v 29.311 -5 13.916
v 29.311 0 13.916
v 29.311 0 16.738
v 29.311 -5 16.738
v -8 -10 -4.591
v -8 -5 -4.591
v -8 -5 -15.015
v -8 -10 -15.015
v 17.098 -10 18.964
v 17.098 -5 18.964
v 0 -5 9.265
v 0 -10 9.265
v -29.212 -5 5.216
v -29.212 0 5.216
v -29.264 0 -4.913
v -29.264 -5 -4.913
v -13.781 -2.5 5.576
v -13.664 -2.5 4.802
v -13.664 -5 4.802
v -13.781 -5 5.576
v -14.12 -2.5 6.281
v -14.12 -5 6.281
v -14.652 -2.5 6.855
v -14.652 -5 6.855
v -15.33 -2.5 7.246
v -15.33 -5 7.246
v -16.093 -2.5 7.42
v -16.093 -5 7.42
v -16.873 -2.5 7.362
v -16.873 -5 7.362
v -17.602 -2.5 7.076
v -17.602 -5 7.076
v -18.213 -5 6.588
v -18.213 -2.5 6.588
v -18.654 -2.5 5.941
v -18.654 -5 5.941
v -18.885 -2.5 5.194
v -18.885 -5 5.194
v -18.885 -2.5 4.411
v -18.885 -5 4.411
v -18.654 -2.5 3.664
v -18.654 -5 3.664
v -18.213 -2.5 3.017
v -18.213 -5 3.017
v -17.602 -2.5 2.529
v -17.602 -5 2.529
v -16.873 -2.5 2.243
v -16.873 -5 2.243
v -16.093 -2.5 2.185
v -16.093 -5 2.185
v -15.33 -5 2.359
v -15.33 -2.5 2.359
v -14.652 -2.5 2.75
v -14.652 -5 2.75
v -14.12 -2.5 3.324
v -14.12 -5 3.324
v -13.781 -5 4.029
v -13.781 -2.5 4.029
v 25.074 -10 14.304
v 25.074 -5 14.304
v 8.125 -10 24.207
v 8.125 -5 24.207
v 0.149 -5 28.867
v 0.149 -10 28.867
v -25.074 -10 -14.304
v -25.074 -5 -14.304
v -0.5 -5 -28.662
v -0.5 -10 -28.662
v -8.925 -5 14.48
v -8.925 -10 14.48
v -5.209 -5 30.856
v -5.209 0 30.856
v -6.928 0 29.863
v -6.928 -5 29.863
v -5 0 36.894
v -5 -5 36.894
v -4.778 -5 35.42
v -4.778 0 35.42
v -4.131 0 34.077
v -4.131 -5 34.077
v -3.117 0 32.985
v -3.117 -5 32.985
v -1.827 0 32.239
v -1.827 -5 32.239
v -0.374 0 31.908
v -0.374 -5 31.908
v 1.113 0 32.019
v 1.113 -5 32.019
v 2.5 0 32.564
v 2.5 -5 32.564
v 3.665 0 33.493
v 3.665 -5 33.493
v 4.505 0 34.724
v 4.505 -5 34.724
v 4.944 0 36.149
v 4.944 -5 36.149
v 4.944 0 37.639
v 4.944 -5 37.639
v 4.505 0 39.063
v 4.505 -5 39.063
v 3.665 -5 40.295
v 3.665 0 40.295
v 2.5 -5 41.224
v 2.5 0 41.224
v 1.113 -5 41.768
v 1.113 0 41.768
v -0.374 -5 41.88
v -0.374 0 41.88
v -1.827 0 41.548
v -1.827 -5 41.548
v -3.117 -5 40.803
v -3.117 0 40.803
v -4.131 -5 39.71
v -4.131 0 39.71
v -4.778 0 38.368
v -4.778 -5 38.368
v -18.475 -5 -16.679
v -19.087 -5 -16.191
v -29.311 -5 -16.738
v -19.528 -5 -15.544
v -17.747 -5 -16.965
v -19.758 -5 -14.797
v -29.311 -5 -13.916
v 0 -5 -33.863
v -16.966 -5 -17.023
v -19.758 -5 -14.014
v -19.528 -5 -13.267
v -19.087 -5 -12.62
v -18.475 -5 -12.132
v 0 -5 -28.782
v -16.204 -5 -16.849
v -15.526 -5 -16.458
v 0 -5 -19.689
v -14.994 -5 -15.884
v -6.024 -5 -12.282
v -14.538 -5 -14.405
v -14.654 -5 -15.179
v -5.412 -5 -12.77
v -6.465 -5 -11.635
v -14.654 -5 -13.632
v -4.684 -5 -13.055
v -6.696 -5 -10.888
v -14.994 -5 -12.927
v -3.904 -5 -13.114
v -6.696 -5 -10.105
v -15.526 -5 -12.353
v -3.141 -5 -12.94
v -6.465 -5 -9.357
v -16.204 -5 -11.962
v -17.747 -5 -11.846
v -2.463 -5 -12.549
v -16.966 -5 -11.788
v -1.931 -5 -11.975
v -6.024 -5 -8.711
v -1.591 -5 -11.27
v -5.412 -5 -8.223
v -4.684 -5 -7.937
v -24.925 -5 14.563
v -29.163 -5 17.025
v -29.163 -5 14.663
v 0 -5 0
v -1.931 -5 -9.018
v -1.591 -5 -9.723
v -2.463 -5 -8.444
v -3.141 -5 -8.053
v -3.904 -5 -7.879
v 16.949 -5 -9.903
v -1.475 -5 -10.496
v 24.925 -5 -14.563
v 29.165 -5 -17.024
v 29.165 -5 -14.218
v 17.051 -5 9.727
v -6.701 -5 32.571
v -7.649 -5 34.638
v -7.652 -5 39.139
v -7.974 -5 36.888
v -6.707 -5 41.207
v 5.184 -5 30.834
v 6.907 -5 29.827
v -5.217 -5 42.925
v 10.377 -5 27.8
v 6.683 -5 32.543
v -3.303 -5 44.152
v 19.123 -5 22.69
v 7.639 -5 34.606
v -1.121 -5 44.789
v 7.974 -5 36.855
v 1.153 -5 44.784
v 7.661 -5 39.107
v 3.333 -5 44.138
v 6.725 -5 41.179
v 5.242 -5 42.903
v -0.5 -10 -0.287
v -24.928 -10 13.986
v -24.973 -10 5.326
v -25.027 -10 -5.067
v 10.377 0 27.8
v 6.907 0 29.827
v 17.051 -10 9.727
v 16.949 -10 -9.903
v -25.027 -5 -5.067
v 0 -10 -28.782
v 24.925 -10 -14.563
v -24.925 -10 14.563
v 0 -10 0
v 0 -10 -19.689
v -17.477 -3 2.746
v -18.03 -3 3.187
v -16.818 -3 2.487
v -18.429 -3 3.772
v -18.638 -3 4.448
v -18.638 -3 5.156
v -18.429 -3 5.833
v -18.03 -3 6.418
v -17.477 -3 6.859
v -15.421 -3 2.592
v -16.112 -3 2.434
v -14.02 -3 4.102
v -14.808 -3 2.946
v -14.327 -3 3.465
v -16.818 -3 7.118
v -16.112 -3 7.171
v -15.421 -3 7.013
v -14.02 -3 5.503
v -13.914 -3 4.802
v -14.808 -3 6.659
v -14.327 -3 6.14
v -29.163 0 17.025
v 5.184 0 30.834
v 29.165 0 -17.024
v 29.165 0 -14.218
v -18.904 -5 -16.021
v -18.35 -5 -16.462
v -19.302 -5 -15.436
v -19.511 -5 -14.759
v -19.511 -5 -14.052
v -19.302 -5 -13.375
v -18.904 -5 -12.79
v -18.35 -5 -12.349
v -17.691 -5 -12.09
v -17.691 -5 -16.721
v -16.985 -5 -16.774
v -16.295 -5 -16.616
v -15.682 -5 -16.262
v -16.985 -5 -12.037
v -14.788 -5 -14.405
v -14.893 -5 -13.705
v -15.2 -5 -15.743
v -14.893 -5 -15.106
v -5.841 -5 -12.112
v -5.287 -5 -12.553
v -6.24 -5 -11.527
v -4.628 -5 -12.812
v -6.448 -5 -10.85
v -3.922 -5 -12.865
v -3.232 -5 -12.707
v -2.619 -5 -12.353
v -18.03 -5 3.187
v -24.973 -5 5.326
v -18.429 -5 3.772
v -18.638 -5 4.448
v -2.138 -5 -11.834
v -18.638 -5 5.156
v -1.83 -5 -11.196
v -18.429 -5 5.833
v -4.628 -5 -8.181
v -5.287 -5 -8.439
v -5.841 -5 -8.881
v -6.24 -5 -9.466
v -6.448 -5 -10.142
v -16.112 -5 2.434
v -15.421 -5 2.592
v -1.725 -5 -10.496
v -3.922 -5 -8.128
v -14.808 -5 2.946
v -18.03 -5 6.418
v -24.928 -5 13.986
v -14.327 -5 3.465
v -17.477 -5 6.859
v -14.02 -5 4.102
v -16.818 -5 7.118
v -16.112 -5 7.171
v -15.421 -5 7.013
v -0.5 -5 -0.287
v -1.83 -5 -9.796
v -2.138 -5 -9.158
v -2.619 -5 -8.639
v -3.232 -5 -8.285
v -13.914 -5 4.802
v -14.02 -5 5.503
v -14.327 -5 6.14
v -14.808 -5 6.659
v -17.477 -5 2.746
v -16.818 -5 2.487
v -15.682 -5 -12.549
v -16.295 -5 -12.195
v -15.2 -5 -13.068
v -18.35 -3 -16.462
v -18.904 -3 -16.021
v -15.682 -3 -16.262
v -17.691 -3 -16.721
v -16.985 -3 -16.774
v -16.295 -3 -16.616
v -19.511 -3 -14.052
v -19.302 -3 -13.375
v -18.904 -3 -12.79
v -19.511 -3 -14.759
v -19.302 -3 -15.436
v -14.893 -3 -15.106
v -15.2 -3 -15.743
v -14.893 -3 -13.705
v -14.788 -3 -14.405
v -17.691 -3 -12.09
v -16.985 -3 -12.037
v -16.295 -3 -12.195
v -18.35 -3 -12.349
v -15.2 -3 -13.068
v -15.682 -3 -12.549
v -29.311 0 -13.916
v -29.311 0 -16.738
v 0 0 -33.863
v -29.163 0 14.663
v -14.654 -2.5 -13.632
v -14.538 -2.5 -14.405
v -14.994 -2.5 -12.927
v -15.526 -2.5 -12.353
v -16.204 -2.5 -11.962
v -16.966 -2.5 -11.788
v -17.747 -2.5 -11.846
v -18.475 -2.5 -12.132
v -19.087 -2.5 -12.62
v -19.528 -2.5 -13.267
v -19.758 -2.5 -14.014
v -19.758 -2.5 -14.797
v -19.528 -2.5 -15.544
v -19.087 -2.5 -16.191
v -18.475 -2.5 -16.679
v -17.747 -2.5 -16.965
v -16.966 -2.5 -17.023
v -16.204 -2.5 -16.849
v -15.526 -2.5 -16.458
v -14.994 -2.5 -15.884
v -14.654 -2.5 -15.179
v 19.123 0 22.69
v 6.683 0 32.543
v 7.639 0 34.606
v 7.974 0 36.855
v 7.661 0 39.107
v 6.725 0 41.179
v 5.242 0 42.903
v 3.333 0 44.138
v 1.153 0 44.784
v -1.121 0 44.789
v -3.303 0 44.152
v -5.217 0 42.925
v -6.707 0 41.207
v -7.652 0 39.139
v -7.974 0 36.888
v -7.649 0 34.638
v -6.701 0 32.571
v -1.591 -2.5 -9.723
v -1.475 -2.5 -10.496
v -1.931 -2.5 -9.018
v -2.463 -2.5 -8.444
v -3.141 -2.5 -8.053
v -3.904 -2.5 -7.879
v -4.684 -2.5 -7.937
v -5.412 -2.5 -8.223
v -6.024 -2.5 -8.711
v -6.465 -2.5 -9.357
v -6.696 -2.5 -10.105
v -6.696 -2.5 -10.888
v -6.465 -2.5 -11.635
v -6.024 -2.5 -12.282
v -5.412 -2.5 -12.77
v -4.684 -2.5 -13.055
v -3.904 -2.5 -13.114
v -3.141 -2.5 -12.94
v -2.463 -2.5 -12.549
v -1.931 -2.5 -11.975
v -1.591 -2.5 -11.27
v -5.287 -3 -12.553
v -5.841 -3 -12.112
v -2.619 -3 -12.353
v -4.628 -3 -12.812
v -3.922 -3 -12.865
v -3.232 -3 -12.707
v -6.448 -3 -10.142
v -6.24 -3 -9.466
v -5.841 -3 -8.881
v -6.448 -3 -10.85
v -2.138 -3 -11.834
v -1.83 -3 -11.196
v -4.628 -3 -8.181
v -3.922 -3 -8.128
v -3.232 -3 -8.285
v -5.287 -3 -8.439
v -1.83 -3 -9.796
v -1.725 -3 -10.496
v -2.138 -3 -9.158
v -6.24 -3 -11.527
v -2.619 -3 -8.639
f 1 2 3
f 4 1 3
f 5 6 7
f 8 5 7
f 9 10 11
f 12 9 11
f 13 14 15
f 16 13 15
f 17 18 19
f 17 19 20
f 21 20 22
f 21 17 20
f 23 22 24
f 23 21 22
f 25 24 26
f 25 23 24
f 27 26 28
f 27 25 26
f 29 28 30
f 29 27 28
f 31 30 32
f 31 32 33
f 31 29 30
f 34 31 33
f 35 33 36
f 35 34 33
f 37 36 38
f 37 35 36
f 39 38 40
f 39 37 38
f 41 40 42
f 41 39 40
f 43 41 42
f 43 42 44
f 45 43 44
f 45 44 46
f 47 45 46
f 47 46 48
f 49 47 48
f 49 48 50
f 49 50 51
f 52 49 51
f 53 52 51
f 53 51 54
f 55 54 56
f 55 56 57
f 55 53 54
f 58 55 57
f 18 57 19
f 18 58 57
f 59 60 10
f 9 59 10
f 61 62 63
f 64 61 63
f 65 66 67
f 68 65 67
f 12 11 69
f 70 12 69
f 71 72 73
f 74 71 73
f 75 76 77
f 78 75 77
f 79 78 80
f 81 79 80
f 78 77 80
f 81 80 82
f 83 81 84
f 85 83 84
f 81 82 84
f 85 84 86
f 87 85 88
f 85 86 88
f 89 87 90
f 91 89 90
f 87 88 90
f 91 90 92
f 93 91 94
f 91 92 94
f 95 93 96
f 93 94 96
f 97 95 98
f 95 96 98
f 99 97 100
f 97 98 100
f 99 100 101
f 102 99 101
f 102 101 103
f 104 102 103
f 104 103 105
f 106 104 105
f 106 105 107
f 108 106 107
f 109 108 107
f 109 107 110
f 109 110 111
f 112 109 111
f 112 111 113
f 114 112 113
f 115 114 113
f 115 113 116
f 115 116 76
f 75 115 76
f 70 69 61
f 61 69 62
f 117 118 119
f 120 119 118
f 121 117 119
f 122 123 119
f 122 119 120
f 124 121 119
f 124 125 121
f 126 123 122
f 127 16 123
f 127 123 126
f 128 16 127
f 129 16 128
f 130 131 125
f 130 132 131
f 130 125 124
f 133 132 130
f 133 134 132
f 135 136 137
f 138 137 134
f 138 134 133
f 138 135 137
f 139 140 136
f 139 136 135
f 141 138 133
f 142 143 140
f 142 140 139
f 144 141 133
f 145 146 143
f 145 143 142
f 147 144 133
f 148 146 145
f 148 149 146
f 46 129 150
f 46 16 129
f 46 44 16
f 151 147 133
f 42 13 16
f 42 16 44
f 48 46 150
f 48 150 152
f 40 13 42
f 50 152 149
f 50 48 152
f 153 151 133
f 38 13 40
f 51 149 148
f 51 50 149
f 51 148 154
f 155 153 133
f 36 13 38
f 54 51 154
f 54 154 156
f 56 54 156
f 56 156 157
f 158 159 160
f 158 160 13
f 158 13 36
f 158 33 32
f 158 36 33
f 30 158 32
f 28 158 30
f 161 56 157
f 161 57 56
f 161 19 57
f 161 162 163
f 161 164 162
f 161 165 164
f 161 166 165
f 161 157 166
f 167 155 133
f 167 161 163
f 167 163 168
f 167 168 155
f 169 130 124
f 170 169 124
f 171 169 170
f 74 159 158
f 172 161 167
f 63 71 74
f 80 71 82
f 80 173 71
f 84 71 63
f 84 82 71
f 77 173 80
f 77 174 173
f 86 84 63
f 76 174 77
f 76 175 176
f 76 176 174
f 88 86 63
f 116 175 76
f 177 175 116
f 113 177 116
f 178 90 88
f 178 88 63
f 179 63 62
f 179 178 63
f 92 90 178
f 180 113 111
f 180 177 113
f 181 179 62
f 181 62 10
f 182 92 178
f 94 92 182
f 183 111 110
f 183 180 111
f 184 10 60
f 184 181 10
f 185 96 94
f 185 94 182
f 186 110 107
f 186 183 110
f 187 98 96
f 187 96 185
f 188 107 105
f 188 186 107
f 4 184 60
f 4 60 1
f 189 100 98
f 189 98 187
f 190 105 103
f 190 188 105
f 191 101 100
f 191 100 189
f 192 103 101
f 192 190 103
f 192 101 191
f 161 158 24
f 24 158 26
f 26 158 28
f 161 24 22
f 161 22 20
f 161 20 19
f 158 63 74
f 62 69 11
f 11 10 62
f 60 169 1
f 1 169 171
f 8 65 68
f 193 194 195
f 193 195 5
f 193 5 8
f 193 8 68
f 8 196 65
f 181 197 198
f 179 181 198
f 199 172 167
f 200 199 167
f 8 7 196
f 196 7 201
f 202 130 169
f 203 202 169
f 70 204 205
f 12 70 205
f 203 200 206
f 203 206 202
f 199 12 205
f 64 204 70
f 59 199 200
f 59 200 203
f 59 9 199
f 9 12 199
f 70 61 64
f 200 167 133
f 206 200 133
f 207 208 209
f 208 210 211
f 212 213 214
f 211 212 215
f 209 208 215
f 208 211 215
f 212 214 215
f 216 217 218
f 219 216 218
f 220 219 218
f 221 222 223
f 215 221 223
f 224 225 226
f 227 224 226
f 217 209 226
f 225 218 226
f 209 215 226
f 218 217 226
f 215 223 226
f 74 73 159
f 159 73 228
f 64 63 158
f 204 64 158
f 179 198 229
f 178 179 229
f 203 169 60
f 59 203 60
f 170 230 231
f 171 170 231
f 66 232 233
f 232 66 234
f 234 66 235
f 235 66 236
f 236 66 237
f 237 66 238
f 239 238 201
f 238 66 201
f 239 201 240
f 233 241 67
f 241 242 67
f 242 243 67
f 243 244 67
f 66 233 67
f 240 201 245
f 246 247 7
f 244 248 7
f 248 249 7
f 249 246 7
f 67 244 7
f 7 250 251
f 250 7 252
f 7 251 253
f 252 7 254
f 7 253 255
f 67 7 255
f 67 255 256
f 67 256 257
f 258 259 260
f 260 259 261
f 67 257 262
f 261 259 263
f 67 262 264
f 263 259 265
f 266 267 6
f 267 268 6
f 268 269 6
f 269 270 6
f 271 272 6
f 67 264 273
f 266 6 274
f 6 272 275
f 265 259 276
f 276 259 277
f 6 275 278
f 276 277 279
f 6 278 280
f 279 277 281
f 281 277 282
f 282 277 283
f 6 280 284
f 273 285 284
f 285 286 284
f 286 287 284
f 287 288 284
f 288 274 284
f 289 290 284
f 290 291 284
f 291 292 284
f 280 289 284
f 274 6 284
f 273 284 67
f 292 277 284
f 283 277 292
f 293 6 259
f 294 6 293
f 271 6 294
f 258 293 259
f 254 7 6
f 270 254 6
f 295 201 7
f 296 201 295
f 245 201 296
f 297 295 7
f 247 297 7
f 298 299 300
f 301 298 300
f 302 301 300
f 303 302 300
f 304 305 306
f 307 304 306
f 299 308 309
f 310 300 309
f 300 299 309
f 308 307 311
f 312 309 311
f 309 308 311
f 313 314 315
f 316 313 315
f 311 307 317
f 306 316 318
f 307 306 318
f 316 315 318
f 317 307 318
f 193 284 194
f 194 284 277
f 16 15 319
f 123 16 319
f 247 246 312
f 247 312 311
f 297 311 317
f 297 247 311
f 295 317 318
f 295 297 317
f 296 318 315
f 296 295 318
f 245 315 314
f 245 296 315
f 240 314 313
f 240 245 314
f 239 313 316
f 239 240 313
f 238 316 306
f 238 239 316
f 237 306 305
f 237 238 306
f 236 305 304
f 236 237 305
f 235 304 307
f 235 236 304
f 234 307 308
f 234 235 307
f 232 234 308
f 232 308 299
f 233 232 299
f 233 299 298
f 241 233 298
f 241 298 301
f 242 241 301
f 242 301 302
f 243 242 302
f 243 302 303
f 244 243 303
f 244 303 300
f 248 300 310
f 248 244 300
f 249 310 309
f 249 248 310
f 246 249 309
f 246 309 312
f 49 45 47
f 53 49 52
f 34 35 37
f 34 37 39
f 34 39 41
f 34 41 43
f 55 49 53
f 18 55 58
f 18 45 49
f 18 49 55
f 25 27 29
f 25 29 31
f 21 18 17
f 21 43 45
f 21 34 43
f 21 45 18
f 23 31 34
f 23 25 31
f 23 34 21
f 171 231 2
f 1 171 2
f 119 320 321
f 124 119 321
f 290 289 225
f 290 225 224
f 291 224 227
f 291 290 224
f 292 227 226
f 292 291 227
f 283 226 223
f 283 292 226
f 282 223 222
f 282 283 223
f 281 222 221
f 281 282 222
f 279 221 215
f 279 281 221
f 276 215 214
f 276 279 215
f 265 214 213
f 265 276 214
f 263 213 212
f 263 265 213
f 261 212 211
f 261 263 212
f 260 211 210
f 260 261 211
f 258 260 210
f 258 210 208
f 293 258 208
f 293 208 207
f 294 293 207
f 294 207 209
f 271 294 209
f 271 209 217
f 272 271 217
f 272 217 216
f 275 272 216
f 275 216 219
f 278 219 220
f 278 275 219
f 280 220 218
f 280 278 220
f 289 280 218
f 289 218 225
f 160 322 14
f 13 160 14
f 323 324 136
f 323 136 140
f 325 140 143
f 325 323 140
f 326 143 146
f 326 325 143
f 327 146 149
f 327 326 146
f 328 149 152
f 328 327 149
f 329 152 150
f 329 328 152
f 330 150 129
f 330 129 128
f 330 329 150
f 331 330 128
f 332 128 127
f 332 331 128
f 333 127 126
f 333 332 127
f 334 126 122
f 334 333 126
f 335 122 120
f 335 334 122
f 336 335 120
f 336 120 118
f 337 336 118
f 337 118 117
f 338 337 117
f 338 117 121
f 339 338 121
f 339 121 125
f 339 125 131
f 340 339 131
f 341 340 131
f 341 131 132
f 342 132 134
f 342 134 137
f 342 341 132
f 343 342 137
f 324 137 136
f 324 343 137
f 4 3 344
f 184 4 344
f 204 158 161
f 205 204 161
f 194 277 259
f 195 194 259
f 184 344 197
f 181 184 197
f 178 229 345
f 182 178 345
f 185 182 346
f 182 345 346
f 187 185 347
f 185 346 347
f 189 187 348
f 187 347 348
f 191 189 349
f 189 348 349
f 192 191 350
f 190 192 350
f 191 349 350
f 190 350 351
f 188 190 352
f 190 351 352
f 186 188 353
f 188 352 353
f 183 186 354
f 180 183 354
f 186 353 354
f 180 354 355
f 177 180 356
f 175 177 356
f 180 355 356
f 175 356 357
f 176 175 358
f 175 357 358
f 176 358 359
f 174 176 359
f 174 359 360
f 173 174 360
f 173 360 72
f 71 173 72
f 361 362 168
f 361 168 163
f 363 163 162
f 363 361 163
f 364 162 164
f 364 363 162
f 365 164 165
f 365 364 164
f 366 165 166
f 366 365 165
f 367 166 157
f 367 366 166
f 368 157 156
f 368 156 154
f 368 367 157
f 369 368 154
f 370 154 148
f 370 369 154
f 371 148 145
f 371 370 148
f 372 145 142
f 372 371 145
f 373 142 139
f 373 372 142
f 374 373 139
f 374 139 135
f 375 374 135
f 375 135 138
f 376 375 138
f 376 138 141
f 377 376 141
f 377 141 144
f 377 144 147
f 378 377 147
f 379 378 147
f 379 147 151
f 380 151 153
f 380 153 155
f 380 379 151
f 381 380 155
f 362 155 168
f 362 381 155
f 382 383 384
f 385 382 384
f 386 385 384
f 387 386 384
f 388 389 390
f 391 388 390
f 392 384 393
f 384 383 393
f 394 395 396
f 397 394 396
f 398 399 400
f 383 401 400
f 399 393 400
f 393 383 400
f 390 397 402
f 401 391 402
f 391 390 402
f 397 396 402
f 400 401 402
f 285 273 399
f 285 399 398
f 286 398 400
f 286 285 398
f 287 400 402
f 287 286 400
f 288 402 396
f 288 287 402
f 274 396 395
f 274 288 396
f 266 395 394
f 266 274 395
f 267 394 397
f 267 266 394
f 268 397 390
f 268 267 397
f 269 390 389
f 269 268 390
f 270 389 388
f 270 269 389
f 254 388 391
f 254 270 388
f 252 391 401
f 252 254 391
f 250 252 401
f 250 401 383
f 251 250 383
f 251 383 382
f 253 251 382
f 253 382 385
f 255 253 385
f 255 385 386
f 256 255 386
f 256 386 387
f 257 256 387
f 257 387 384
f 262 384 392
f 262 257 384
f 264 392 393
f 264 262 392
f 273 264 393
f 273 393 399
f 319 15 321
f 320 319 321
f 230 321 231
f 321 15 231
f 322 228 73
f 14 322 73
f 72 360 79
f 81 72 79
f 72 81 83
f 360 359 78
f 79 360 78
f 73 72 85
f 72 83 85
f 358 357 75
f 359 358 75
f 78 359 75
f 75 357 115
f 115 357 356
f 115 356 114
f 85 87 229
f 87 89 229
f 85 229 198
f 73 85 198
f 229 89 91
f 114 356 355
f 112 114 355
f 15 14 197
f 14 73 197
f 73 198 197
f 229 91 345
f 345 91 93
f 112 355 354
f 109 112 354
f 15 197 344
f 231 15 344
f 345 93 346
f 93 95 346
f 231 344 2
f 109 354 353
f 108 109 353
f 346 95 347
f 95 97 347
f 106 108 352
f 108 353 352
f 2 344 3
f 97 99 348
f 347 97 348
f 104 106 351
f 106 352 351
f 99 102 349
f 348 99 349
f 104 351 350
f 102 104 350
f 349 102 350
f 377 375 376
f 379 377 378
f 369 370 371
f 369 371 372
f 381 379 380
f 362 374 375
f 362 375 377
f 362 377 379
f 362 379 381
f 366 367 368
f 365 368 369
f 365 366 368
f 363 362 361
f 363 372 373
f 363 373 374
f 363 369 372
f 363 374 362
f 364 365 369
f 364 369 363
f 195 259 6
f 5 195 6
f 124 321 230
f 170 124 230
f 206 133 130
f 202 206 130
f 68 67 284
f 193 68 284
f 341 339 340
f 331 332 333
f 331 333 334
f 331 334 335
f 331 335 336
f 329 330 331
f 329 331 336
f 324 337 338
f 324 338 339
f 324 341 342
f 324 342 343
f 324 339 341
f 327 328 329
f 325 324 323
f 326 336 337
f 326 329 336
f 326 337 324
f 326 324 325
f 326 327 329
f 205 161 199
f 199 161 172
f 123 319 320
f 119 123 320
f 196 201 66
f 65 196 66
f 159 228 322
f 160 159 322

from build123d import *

# Parameters (mm, degrees)
F1_DEPTH  = 10
F3_DEPTH  = 5
F5_D      = 10
F8_DEPTH  = 5
F9_R      = 2.375
F10_DEPTH = 2
F12_R     = 2.625
F13_DEPTH = 2.5


with BuildPart() as f1:
    # F0 (on Front) → F1 (new body)
    with BuildSketch(Plane.XZ):
        Polygon((0, -28.7818589424), (24.9249300158, -14.5630078294), (25.0743997437, 14.3041186666), (17.0984221386, 18.964281172), (0, 9.2654265239), (-8.9251444928, 14.4801632973), (8.1254473329, 24.2069639906), (0.1494697278, 28.867126496), (-24.9249300158, 14.5630078294), (0, 0), (17.0505918257, 9.7268006933), (16.9489524108, -9.902845324), (0, -19.6890313633), align=None)
    extrude(amount=F1_DEPTH)

    # F2 (on Front) → F3 (join)
    with BuildSketch(Plane.XZ):
        with BuildLine():
            Line((29.310615077, 16.7375632336), (19.1225525955, 22.6901911283))
            Line((19.1225525955, 22.6901911283), (10.3774396625, 27.7997386882))
            Line((10.3774396625, 27.7997386882), (6.907399226, 29.8271957769))
            Line((6.907399226, 29.8271957769), (5.1838801546, 30.8342044912))
            ThreePointArc((5.1838801546, 30.8342044912), (0.0163801689, 44.8681793749), (-5.208730248, 30.8555519172))
            Line((-5.208730248, 30.8555519172), (-6.9280873675, 29.8628142188))
            Line((-6.9280873675, 29.8628142188), (-29.1626386522, 17.0248313374))
            Line((-29.1626386522, 17.0248313374), (-29.1626386522, 14.6632419108))
            Line((-29.1626386522, 14.6632419108), (-29.2115575603, 5.2155207649))
            Line((-29.2115575603, 5.2155207649), (-29.2640002175, -4.9127429423))
            Line((-29.2640002175, -4.9127429423), (-29.3106159128, -13.9156440154))
            Line((-29.3106159128, -13.9156440154), (-29.3106159128, -16.7375610477))
            Line((-29.3106159128, -16.7375610477), (0, -33.8630145094))
            Line((0, -33.8630145094), (29.1649410292, -17.0235179072))
            Line((29.1649410292, -17.0235179072), (29.1649410292, -14.2184218337))
            Line((29.1649410292, -14.2184218337), (29.310615077, 13.9156440197))
            Line((29.310615077, 13.9156440197), (29.310615077, 16.7375632336))
        make_face()
    extrude(amount=F3_DEPTH)

    # F5 (through all)
    with Locations(Plane(origin=(0, 0, 0), x_dir=(1, 0, 0), z_dir=(0, 1, 0))):
        with Locations((0, -36.8937887251)):
            Hole(F5_D / 2)

    # F12 (on offset) → F13 (cut)
    with BuildSketch(Plane.XZ.offset(2.5)):
        with Locations((-16.2890967273, 4.8024673149)):
            Circle(F12_R)
        with Locations((-4.099873935, -10.4962924677)):
            Circle(F12_R)
        with Locations((-17.1626120781, -14.4054982309)):
            Circle(F12_R)
    extrude(amount=F13_DEPTH, mode=Mode.SUBTRACT)


with BuildPart() as f8:
    # F7 (on offset) → F8 (new body)
    with BuildSketch(Plane.XZ.offset(5)):
        Polygon((-25.0743997437, -14.3041186666), (-0.5, -28.6623205007), (-0.5, -0.2869517712), (-24.9279194104, 13.9856652995), (-24.9727603287, 5.3255273507), (-8, -4.5912283392), (-8, -15.0148331786), (-25.0265694308, -5.0666381879), align=None)
    extrude(amount=F8_DEPTH)

    # F9 (on offset) → F10 (join)
    with BuildSketch(Plane.XZ.offset(5)):
        with Locations((-16.2890967273, 4.8024673149)):
            Circle(F9_R)
        with Locations((-17.1626120781, -14.4054982309)):
            Circle(F9_R)
        with Locations((-4.099873935, -10.4962924677)):
            Circle(F9_R)
    extrude(amount=-F10_DEPTH)


solid = Compound([f1.part, f8.part])
